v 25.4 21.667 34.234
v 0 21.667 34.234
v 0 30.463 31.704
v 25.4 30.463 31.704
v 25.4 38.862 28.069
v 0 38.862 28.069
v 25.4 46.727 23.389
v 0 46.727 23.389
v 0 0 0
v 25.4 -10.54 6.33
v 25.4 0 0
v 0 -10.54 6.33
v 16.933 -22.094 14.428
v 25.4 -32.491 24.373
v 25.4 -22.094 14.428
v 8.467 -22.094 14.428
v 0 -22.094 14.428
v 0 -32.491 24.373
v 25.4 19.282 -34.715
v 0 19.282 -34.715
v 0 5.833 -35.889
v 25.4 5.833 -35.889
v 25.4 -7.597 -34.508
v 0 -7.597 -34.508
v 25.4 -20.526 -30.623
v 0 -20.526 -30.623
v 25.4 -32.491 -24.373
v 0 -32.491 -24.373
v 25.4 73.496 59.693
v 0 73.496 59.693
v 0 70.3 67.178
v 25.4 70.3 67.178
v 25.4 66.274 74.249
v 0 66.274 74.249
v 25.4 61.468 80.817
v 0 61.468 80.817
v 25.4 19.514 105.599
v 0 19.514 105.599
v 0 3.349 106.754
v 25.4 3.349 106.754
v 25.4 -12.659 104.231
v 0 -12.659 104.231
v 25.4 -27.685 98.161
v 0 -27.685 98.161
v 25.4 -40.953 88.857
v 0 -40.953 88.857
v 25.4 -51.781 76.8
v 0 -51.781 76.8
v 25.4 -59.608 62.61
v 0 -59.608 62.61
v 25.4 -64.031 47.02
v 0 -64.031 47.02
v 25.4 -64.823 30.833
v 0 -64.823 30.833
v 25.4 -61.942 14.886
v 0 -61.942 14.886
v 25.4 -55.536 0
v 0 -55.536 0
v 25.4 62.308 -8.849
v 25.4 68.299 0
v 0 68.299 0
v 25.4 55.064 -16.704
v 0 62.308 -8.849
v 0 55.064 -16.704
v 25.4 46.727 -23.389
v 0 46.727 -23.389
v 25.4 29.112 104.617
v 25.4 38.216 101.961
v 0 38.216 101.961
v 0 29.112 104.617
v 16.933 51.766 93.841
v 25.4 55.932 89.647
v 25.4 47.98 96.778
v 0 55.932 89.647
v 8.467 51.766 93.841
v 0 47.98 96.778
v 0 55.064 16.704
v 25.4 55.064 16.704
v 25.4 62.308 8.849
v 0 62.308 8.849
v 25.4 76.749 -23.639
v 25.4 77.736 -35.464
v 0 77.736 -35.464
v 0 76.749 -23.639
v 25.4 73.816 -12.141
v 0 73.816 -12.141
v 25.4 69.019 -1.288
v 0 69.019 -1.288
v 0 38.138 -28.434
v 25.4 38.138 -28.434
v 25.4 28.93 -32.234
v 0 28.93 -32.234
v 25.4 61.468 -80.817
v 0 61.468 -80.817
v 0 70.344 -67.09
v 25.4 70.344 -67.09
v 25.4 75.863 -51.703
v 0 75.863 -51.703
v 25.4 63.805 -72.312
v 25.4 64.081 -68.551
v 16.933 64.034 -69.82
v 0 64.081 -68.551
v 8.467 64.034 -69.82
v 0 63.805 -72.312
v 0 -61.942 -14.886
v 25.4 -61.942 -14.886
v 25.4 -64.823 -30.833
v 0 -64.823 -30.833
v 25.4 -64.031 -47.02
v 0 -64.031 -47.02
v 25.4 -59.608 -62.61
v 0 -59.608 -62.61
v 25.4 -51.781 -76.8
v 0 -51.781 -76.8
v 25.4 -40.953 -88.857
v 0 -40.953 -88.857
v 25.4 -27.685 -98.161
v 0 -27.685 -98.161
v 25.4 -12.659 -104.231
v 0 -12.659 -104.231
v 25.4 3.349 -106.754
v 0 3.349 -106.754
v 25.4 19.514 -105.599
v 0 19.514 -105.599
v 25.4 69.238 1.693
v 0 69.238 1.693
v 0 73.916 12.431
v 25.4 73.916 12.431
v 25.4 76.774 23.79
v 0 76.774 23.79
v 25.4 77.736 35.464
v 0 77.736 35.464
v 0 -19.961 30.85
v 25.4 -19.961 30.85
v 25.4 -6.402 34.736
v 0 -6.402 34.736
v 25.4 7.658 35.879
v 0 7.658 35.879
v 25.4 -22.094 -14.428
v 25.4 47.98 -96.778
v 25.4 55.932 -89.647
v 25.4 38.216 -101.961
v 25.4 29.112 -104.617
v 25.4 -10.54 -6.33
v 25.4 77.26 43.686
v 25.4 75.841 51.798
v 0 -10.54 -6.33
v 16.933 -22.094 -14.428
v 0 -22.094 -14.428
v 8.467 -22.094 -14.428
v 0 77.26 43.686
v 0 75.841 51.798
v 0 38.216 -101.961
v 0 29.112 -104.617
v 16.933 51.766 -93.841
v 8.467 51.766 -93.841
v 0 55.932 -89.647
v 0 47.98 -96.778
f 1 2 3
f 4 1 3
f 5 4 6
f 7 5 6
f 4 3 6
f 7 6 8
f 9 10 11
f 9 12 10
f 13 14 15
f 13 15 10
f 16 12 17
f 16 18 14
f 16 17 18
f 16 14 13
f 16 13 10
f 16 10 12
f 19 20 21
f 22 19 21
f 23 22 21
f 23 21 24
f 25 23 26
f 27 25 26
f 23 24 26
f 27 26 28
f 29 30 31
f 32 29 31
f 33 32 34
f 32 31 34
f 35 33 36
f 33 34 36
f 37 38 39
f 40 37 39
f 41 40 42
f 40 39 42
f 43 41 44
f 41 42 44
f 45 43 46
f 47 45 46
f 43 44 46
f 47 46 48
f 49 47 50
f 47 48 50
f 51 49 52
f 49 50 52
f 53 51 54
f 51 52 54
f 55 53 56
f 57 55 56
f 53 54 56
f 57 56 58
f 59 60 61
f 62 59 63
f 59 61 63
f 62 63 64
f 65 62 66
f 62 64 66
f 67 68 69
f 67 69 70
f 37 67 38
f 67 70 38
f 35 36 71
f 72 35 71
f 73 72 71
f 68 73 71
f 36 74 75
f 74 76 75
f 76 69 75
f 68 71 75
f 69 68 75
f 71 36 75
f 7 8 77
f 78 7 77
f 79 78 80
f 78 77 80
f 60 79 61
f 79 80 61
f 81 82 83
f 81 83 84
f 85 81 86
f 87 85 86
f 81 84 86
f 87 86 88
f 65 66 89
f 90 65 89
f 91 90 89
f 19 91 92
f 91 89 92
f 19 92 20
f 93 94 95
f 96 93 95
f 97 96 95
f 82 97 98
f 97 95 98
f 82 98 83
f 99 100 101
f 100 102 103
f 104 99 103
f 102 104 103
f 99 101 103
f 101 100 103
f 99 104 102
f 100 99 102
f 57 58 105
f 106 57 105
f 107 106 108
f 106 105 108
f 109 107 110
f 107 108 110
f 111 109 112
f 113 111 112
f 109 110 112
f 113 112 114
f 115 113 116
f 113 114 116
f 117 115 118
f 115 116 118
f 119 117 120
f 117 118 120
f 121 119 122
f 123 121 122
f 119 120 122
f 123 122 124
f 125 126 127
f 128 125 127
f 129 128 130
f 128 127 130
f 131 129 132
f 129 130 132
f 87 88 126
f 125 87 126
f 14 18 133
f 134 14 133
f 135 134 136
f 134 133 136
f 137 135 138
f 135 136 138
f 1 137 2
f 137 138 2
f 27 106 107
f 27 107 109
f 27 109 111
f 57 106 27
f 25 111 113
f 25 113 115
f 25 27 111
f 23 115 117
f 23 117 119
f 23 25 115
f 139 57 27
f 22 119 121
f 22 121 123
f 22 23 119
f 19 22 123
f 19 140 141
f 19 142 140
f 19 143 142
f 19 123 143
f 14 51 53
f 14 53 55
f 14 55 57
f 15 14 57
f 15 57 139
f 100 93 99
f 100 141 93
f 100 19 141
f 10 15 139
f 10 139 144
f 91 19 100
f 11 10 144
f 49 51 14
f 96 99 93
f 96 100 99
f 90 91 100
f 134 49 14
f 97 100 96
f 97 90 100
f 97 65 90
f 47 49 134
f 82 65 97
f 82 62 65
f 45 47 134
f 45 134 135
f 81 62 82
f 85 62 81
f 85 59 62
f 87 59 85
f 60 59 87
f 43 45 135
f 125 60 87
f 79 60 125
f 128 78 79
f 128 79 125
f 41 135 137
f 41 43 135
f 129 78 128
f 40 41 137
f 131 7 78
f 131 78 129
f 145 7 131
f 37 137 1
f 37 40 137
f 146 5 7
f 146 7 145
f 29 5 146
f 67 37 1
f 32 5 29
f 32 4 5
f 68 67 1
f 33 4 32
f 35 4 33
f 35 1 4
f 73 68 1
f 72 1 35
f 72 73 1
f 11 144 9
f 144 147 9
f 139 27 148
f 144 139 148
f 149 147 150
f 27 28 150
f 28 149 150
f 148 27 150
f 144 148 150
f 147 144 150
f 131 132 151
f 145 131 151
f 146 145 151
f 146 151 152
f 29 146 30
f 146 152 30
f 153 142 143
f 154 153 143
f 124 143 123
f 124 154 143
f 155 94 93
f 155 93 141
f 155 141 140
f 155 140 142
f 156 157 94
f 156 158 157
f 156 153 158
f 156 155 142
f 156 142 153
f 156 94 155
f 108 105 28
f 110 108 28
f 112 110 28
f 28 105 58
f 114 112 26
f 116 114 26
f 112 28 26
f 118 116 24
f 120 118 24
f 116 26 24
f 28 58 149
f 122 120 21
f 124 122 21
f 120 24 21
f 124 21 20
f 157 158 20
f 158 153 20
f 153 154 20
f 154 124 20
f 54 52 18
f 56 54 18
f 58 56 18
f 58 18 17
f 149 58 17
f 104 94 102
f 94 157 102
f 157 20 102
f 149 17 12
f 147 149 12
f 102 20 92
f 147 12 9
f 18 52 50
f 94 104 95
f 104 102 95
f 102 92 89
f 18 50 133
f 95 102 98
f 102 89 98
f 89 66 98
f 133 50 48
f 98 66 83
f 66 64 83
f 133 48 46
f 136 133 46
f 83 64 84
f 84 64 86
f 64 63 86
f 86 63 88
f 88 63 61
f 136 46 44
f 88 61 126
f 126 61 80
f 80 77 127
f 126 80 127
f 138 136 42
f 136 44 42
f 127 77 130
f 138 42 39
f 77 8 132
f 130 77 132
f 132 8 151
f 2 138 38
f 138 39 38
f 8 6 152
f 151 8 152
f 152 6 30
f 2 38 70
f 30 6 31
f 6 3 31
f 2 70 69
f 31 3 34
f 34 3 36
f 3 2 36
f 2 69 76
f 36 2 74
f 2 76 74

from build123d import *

# Parameters (mm, degrees)
F1_DEPTH = 25.4


with BuildPart() as f1:
    # F0 (on Right) → F1 (new body)
    with BuildSketch(Plane.YZ):
        with BuildLine():
            ThreePointArc((77.7355076163, 35.4636907578), (76.6675961502, 47.7624663657), (73.4958271318, 59.6931074906))
            Line((73.4958271318, 59.6931074906), (69.2378436874, 1.6926861527))
            ThreePointArc((69.2378436874, 1.6926861527), (75.5784886533, 18.0518338473), (77.7355076163, 35.4636907578))
        make_face()
        with BuildLine():
            Line((69.2378436874, 1.6926861527), (73.4958271318, 59.6931074906))
            ThreePointArc((73.4958271318, 59.6931074906), (68.3879297776, 70.7709703077), (61.4677361542, 80.8168938687))
            add(Edge.make_bspline(
                [(46.7271482261, 23.3890579279), (57.3671713501, 38.6358972227), (67.4277924366, 61.0196278452), (62.6176115866, 78.1431138882), (61.4677361542, 80.8168938687)],
                knots=[0.2275291842, 0.2275291842, 0.2275291842, 0.2275291842, 0.3610428006, 0.3876214238, 0.3876214238, 0.3876214238, 0.3876214238], degree=3))
            ThreePointArc((46.7271482261, 23.3890579279), (58.8331802448, 12.9122292433), (68.2986060932, 0))
            ThreePointArc((68.2986060932, 0), (68.7739653696, 0.8431577995), (69.2378436874, 1.6926861527))
        make_face()
        with BuildLine():
            Line((69.0189883561, -1.2884671556), (69.2378436874, 1.6926861527))
            ThreePointArc((69.2378436874, 1.6926861527), (68.7739653696, 0.8431577995), (68.2986060932, 0))
            ThreePointArc((68.2986060932, 0), (68.6621292842, -0.6423706226), (69.0189883561, -1.2884671556))
        make_face()
        with BuildLine():
            add(Edge.make_bspline(
                [(46.7271482261, 23.3890579279), (57.3671713501, 38.6358972227), (67.4277924366, 61.0196278452), (62.6176115866, 78.1431138882), (61.4677361542, 80.8168938687)],
                knots=[0.2275291842, 0.2275291842, 0.2275291842, 0.2275291842, 0.3610428006, 0.3876214238, 0.3876214238, 0.3876214238, 0.3876214238], degree=3))
            ThreePointArc((61.4677361542, 80.8168938687), (42.6716941747, 96.9001796523), (19.5137307938, 105.5991455529))
            add(Edge.make_bspline(
                [(19.5137307938, 105.5991455529), (15.2484459589, 105.6418292249), (-17.4670589129, 101.9834872227), (-51.4356414133, 56.0713753865), (-36.7498246069, 29.4728703431), (-32.4913798704, 24.3725458831)],
                knots=[0.5361274609, 0.5361274609, 0.5361274609, 0.5361274609, 0.5710508717, 0.8014313121, 0.8647451677, 0.8647451677, 0.8647451677, 0.8647451677], degree=3))
            ThreePointArc((-32.4913798704, 24.3725458831), (-6.4015352071, 34.736385461), (21.6668981331, 34.2341751698))
            ThreePointArc((21.6668981331, 34.2341751698), (34.7206440257, 30.0215683701), (46.7271482261, 23.3890579279))
        make_face()
        with BuildLine():
            ThreePointArc((19.5137307938, 105.5991455529), (42.6716941747, 96.9001796523), (61.4677361542, 80.8168938687))
            add(Edge.make_bspline(
                [(61.4677361542, 80.8168938687), (55.0428945656, 95.7564363048), (37.6511501332, 105.4176402871), (19.5137307938, 105.5991455529)],
                knots=[0.3876214238, 0.3876214238, 0.3876214238, 0.3876214238, 0.5361274609, 0.5361274609, 0.5361274609, 0.5361274609], degree=3))
        make_face()
        with BuildLine():
            ThreePointArc((77.7355076163, -35.4636907578), (75.5220462625, -17.829040093), (69.0189883561, -1.2884671556))
            Line((69.0189883561, -1.2884671556), (64.0810679537, -68.550697648))
            add(Edge.make_bspline(
                [(64.0810679537, -68.550697648), (64.055573163, -69.8265995508), (63.9650070893, -71.0818079643), (63.8049086741, -72.3124207221)],
                knots=[0.3500957655, 0.3500957655, 0.3500957655, 0.3500957655, 0.3610428006, 0.3610428006, 0.3610428006, 0.3610428006], degree=3))
            add(Edge.make_bspline(
                [(63.8049086741, -72.3124207221), (63.4162011029, -75.3002610177), (62.6176115866, -78.1431138882), (61.4677361542, -80.8168938687)],
                knots=[0.3610428006, 0.3610428006, 0.3610428006, 0.3610428006, 0.3876214238, 0.3876214238, 0.3876214238, 0.3876214238], degree=3))
            ThreePointArc((61.4677361542, -80.8168938687), (73.5455465545, -59.5549413519), (77.7355076163, -35.4636907578))
        make_face()
        with BuildLine():
            Line((64.0810679537, -68.550697648), (69.0189883561, -1.2884671556))
            ThreePointArc((69.0189883561, -1.2884671556), (68.6621292842, -0.6423706226), (68.2986060932, 0))
            ThreePointArc((68.2986060932, 0), (58.8331802447, -12.9122292433), (46.7271482261, -23.3890579279))
            add(Edge.make_bspline(
                [(46.7271482261, -23.3890579279), (56.4947756325, -37.3857798919), (64.3665159576, -54.2652831945), (64.0810679537, -68.550697648)],
                knots=[0.2275291842, 0.2275291842, 0.2275291842, 0.2275291842, 0.3500957655, 0.3500957655, 0.3500957655, 0.3500957655], degree=3))
        make_face()
        with BuildLine():
            add(Edge.make_bspline(
                [(19.5137307938, 105.5991455529), (15.2484459589, 105.6418292249), (-17.4670589129, 101.9834872227), (-51.4356414133, 56.0713753865), (-36.7498246069, 29.4728703431), (-32.4913798704, 24.3725458831)],
                knots=[0.5361274609, 0.5361274609, 0.5361274609, 0.5361274609, 0.5710508717, 0.8014313121, 0.8647451677, 0.8647451677, 0.8647451677, 0.8647451677], degree=3))
            ThreePointArc((19.5137307938, 105.5991455529), (-51.7805921013, 76.7996475885), (-55.5363464012, 0))
            ThreePointArc((-55.5363464012, 0), (-45.4663442086, 13.5596369664), (-32.4913798704, 24.3725458831))
        make_face()
        with BuildLine():
            Line((63.8049086741, -72.3124207222), (64.0810679537, -68.550697648))
            add(Edge.make_bspline(
                [(46.7271482261, -23.3890579279), (56.4947756325, -37.3857798919), (64.3665159576, -54.2652831945), (64.0810679537, -68.550697648)],
                knots=[0.2275291842, 0.2275291842, 0.2275291842, 0.2275291842, 0.3500957655, 0.3500957655, 0.3500957655, 0.3500957655], degree=3))
            ThreePointArc((46.7271482261, -23.3890579279), (33.6000701349, -30.4952094493), (19.2818065466, -34.7147943189))
            ThreePointArc((19.2818065466, -34.7147943189), (-7.5965149208, -34.5082512887), (-32.4913798704, -24.3725458831))
            add(Edge.make_bspline(
                [(19.5137307938, -105.5991455529), (15.2484459589, -105.6418292249), (-17.4670589129, -101.9834872227), (-51.4356414133, -56.0713753865), (-36.7498246069, -29.4728703431), (-32.4913798704, -24.3725458831)],
                knots=[0.5361274609, 0.5361274609, 0.5361274609, 0.5361274609, 0.5710508717, 0.8014313121, 0.8647451677, 0.8647451677, 0.8647451677, 0.8647451677], degree=3))
            ThreePointArc((19.5137307938, -105.5991455529), (42.6716941747, -96.9001796523), (61.4677361542, -80.8168938687))
            add(Edge.make_bspline(
                [(63.8049086741, -72.3124207221), (63.4162011029, -75.3002610177), (62.6176115866, -78.1431138882), (61.4677361542, -80.8168938687)],
                knots=[0.3610428006, 0.3610428006, 0.3610428006, 0.3610428006, 0.3876214238, 0.3876214238, 0.3876214238, 0.3876214238], degree=3))
        make_face()
        with BuildLine():
            ThreePointArc((-32.4913798704, 24.3725458831), (-45.4663442086, 13.5596369664), (-55.5363464012, 0))
            ThreePointArc((-55.5363464012, 0), (-45.4663442086, -13.5596369664), (-32.4913798704, -24.3725458831))
            add(Edge.make_bspline(
                [(-32.4913798704, -24.3725458831), (-23.3942363951, -13.4769287613), (-9.3112886841, -5.4733246177), (0, 0)],
                knots=[0.8647451677, 0.8647451677, 0.8647451677, 0.8647451677, 1, 1, 1, 1], degree=3))
            add(Edge.make_bspline(
                [(-32.4913798704, 24.3725458831), (-23.3942363951, 13.4769287613), (-9.3112886841, 5.4733246177), (0, 0)],
                knots=[0.8647451677, 0.8647451677, 0.8647451677, 0.8647451677, 1, 1, 1, 1], degree=3))
        make_face()
        with BuildLine():
            ThreePointArc((-32.4913798704, -24.3725458831), (-45.4663442086, -13.5596369664), (-55.5363464012, 0))
            ThreePointArc((-55.5363464012, 0), (-51.7805921013, -76.7996475885), (19.5137307938, -105.5991455529))
            add(Edge.make_bspline(
                [(19.5137307938, -105.5991455529), (15.2484459589, -105.6418292249), (-17.4670589129, -101.9834872227), (-51.4356414133, -56.0713753865), (-36.7498246069, -29.4728703431), (-32.4913798704, -24.3725458831)],
                knots=[0.5361274609, 0.5361274609, 0.5361274609, 0.5361274609, 0.5710508717, 0.8014313121, 0.8647451677, 0.8647451677, 0.8647451677, 0.8647451677], degree=3))
        make_face()
        with BuildLine():
            add(Edge.make_bspline(
                [(61.4677361542, -80.8168938687), (55.0428945656, -95.7564363048), (37.6511501332, -105.4176402871), (19.5137307938, -105.5991455529)],
                knots=[0.3876214238, 0.3876214238, 0.3876214238, 0.3876214238, 0.5361274609, 0.5361274609, 0.5361274609, 0.5361274609], degree=3))
            ThreePointArc((61.4677361542, -80.8168938687), (42.6716941747, -96.9001796523), (19.5137307938, -105.5991455529))
        make_face()
    extrude(amount=F1_DEPTH)


solid = f1.part
